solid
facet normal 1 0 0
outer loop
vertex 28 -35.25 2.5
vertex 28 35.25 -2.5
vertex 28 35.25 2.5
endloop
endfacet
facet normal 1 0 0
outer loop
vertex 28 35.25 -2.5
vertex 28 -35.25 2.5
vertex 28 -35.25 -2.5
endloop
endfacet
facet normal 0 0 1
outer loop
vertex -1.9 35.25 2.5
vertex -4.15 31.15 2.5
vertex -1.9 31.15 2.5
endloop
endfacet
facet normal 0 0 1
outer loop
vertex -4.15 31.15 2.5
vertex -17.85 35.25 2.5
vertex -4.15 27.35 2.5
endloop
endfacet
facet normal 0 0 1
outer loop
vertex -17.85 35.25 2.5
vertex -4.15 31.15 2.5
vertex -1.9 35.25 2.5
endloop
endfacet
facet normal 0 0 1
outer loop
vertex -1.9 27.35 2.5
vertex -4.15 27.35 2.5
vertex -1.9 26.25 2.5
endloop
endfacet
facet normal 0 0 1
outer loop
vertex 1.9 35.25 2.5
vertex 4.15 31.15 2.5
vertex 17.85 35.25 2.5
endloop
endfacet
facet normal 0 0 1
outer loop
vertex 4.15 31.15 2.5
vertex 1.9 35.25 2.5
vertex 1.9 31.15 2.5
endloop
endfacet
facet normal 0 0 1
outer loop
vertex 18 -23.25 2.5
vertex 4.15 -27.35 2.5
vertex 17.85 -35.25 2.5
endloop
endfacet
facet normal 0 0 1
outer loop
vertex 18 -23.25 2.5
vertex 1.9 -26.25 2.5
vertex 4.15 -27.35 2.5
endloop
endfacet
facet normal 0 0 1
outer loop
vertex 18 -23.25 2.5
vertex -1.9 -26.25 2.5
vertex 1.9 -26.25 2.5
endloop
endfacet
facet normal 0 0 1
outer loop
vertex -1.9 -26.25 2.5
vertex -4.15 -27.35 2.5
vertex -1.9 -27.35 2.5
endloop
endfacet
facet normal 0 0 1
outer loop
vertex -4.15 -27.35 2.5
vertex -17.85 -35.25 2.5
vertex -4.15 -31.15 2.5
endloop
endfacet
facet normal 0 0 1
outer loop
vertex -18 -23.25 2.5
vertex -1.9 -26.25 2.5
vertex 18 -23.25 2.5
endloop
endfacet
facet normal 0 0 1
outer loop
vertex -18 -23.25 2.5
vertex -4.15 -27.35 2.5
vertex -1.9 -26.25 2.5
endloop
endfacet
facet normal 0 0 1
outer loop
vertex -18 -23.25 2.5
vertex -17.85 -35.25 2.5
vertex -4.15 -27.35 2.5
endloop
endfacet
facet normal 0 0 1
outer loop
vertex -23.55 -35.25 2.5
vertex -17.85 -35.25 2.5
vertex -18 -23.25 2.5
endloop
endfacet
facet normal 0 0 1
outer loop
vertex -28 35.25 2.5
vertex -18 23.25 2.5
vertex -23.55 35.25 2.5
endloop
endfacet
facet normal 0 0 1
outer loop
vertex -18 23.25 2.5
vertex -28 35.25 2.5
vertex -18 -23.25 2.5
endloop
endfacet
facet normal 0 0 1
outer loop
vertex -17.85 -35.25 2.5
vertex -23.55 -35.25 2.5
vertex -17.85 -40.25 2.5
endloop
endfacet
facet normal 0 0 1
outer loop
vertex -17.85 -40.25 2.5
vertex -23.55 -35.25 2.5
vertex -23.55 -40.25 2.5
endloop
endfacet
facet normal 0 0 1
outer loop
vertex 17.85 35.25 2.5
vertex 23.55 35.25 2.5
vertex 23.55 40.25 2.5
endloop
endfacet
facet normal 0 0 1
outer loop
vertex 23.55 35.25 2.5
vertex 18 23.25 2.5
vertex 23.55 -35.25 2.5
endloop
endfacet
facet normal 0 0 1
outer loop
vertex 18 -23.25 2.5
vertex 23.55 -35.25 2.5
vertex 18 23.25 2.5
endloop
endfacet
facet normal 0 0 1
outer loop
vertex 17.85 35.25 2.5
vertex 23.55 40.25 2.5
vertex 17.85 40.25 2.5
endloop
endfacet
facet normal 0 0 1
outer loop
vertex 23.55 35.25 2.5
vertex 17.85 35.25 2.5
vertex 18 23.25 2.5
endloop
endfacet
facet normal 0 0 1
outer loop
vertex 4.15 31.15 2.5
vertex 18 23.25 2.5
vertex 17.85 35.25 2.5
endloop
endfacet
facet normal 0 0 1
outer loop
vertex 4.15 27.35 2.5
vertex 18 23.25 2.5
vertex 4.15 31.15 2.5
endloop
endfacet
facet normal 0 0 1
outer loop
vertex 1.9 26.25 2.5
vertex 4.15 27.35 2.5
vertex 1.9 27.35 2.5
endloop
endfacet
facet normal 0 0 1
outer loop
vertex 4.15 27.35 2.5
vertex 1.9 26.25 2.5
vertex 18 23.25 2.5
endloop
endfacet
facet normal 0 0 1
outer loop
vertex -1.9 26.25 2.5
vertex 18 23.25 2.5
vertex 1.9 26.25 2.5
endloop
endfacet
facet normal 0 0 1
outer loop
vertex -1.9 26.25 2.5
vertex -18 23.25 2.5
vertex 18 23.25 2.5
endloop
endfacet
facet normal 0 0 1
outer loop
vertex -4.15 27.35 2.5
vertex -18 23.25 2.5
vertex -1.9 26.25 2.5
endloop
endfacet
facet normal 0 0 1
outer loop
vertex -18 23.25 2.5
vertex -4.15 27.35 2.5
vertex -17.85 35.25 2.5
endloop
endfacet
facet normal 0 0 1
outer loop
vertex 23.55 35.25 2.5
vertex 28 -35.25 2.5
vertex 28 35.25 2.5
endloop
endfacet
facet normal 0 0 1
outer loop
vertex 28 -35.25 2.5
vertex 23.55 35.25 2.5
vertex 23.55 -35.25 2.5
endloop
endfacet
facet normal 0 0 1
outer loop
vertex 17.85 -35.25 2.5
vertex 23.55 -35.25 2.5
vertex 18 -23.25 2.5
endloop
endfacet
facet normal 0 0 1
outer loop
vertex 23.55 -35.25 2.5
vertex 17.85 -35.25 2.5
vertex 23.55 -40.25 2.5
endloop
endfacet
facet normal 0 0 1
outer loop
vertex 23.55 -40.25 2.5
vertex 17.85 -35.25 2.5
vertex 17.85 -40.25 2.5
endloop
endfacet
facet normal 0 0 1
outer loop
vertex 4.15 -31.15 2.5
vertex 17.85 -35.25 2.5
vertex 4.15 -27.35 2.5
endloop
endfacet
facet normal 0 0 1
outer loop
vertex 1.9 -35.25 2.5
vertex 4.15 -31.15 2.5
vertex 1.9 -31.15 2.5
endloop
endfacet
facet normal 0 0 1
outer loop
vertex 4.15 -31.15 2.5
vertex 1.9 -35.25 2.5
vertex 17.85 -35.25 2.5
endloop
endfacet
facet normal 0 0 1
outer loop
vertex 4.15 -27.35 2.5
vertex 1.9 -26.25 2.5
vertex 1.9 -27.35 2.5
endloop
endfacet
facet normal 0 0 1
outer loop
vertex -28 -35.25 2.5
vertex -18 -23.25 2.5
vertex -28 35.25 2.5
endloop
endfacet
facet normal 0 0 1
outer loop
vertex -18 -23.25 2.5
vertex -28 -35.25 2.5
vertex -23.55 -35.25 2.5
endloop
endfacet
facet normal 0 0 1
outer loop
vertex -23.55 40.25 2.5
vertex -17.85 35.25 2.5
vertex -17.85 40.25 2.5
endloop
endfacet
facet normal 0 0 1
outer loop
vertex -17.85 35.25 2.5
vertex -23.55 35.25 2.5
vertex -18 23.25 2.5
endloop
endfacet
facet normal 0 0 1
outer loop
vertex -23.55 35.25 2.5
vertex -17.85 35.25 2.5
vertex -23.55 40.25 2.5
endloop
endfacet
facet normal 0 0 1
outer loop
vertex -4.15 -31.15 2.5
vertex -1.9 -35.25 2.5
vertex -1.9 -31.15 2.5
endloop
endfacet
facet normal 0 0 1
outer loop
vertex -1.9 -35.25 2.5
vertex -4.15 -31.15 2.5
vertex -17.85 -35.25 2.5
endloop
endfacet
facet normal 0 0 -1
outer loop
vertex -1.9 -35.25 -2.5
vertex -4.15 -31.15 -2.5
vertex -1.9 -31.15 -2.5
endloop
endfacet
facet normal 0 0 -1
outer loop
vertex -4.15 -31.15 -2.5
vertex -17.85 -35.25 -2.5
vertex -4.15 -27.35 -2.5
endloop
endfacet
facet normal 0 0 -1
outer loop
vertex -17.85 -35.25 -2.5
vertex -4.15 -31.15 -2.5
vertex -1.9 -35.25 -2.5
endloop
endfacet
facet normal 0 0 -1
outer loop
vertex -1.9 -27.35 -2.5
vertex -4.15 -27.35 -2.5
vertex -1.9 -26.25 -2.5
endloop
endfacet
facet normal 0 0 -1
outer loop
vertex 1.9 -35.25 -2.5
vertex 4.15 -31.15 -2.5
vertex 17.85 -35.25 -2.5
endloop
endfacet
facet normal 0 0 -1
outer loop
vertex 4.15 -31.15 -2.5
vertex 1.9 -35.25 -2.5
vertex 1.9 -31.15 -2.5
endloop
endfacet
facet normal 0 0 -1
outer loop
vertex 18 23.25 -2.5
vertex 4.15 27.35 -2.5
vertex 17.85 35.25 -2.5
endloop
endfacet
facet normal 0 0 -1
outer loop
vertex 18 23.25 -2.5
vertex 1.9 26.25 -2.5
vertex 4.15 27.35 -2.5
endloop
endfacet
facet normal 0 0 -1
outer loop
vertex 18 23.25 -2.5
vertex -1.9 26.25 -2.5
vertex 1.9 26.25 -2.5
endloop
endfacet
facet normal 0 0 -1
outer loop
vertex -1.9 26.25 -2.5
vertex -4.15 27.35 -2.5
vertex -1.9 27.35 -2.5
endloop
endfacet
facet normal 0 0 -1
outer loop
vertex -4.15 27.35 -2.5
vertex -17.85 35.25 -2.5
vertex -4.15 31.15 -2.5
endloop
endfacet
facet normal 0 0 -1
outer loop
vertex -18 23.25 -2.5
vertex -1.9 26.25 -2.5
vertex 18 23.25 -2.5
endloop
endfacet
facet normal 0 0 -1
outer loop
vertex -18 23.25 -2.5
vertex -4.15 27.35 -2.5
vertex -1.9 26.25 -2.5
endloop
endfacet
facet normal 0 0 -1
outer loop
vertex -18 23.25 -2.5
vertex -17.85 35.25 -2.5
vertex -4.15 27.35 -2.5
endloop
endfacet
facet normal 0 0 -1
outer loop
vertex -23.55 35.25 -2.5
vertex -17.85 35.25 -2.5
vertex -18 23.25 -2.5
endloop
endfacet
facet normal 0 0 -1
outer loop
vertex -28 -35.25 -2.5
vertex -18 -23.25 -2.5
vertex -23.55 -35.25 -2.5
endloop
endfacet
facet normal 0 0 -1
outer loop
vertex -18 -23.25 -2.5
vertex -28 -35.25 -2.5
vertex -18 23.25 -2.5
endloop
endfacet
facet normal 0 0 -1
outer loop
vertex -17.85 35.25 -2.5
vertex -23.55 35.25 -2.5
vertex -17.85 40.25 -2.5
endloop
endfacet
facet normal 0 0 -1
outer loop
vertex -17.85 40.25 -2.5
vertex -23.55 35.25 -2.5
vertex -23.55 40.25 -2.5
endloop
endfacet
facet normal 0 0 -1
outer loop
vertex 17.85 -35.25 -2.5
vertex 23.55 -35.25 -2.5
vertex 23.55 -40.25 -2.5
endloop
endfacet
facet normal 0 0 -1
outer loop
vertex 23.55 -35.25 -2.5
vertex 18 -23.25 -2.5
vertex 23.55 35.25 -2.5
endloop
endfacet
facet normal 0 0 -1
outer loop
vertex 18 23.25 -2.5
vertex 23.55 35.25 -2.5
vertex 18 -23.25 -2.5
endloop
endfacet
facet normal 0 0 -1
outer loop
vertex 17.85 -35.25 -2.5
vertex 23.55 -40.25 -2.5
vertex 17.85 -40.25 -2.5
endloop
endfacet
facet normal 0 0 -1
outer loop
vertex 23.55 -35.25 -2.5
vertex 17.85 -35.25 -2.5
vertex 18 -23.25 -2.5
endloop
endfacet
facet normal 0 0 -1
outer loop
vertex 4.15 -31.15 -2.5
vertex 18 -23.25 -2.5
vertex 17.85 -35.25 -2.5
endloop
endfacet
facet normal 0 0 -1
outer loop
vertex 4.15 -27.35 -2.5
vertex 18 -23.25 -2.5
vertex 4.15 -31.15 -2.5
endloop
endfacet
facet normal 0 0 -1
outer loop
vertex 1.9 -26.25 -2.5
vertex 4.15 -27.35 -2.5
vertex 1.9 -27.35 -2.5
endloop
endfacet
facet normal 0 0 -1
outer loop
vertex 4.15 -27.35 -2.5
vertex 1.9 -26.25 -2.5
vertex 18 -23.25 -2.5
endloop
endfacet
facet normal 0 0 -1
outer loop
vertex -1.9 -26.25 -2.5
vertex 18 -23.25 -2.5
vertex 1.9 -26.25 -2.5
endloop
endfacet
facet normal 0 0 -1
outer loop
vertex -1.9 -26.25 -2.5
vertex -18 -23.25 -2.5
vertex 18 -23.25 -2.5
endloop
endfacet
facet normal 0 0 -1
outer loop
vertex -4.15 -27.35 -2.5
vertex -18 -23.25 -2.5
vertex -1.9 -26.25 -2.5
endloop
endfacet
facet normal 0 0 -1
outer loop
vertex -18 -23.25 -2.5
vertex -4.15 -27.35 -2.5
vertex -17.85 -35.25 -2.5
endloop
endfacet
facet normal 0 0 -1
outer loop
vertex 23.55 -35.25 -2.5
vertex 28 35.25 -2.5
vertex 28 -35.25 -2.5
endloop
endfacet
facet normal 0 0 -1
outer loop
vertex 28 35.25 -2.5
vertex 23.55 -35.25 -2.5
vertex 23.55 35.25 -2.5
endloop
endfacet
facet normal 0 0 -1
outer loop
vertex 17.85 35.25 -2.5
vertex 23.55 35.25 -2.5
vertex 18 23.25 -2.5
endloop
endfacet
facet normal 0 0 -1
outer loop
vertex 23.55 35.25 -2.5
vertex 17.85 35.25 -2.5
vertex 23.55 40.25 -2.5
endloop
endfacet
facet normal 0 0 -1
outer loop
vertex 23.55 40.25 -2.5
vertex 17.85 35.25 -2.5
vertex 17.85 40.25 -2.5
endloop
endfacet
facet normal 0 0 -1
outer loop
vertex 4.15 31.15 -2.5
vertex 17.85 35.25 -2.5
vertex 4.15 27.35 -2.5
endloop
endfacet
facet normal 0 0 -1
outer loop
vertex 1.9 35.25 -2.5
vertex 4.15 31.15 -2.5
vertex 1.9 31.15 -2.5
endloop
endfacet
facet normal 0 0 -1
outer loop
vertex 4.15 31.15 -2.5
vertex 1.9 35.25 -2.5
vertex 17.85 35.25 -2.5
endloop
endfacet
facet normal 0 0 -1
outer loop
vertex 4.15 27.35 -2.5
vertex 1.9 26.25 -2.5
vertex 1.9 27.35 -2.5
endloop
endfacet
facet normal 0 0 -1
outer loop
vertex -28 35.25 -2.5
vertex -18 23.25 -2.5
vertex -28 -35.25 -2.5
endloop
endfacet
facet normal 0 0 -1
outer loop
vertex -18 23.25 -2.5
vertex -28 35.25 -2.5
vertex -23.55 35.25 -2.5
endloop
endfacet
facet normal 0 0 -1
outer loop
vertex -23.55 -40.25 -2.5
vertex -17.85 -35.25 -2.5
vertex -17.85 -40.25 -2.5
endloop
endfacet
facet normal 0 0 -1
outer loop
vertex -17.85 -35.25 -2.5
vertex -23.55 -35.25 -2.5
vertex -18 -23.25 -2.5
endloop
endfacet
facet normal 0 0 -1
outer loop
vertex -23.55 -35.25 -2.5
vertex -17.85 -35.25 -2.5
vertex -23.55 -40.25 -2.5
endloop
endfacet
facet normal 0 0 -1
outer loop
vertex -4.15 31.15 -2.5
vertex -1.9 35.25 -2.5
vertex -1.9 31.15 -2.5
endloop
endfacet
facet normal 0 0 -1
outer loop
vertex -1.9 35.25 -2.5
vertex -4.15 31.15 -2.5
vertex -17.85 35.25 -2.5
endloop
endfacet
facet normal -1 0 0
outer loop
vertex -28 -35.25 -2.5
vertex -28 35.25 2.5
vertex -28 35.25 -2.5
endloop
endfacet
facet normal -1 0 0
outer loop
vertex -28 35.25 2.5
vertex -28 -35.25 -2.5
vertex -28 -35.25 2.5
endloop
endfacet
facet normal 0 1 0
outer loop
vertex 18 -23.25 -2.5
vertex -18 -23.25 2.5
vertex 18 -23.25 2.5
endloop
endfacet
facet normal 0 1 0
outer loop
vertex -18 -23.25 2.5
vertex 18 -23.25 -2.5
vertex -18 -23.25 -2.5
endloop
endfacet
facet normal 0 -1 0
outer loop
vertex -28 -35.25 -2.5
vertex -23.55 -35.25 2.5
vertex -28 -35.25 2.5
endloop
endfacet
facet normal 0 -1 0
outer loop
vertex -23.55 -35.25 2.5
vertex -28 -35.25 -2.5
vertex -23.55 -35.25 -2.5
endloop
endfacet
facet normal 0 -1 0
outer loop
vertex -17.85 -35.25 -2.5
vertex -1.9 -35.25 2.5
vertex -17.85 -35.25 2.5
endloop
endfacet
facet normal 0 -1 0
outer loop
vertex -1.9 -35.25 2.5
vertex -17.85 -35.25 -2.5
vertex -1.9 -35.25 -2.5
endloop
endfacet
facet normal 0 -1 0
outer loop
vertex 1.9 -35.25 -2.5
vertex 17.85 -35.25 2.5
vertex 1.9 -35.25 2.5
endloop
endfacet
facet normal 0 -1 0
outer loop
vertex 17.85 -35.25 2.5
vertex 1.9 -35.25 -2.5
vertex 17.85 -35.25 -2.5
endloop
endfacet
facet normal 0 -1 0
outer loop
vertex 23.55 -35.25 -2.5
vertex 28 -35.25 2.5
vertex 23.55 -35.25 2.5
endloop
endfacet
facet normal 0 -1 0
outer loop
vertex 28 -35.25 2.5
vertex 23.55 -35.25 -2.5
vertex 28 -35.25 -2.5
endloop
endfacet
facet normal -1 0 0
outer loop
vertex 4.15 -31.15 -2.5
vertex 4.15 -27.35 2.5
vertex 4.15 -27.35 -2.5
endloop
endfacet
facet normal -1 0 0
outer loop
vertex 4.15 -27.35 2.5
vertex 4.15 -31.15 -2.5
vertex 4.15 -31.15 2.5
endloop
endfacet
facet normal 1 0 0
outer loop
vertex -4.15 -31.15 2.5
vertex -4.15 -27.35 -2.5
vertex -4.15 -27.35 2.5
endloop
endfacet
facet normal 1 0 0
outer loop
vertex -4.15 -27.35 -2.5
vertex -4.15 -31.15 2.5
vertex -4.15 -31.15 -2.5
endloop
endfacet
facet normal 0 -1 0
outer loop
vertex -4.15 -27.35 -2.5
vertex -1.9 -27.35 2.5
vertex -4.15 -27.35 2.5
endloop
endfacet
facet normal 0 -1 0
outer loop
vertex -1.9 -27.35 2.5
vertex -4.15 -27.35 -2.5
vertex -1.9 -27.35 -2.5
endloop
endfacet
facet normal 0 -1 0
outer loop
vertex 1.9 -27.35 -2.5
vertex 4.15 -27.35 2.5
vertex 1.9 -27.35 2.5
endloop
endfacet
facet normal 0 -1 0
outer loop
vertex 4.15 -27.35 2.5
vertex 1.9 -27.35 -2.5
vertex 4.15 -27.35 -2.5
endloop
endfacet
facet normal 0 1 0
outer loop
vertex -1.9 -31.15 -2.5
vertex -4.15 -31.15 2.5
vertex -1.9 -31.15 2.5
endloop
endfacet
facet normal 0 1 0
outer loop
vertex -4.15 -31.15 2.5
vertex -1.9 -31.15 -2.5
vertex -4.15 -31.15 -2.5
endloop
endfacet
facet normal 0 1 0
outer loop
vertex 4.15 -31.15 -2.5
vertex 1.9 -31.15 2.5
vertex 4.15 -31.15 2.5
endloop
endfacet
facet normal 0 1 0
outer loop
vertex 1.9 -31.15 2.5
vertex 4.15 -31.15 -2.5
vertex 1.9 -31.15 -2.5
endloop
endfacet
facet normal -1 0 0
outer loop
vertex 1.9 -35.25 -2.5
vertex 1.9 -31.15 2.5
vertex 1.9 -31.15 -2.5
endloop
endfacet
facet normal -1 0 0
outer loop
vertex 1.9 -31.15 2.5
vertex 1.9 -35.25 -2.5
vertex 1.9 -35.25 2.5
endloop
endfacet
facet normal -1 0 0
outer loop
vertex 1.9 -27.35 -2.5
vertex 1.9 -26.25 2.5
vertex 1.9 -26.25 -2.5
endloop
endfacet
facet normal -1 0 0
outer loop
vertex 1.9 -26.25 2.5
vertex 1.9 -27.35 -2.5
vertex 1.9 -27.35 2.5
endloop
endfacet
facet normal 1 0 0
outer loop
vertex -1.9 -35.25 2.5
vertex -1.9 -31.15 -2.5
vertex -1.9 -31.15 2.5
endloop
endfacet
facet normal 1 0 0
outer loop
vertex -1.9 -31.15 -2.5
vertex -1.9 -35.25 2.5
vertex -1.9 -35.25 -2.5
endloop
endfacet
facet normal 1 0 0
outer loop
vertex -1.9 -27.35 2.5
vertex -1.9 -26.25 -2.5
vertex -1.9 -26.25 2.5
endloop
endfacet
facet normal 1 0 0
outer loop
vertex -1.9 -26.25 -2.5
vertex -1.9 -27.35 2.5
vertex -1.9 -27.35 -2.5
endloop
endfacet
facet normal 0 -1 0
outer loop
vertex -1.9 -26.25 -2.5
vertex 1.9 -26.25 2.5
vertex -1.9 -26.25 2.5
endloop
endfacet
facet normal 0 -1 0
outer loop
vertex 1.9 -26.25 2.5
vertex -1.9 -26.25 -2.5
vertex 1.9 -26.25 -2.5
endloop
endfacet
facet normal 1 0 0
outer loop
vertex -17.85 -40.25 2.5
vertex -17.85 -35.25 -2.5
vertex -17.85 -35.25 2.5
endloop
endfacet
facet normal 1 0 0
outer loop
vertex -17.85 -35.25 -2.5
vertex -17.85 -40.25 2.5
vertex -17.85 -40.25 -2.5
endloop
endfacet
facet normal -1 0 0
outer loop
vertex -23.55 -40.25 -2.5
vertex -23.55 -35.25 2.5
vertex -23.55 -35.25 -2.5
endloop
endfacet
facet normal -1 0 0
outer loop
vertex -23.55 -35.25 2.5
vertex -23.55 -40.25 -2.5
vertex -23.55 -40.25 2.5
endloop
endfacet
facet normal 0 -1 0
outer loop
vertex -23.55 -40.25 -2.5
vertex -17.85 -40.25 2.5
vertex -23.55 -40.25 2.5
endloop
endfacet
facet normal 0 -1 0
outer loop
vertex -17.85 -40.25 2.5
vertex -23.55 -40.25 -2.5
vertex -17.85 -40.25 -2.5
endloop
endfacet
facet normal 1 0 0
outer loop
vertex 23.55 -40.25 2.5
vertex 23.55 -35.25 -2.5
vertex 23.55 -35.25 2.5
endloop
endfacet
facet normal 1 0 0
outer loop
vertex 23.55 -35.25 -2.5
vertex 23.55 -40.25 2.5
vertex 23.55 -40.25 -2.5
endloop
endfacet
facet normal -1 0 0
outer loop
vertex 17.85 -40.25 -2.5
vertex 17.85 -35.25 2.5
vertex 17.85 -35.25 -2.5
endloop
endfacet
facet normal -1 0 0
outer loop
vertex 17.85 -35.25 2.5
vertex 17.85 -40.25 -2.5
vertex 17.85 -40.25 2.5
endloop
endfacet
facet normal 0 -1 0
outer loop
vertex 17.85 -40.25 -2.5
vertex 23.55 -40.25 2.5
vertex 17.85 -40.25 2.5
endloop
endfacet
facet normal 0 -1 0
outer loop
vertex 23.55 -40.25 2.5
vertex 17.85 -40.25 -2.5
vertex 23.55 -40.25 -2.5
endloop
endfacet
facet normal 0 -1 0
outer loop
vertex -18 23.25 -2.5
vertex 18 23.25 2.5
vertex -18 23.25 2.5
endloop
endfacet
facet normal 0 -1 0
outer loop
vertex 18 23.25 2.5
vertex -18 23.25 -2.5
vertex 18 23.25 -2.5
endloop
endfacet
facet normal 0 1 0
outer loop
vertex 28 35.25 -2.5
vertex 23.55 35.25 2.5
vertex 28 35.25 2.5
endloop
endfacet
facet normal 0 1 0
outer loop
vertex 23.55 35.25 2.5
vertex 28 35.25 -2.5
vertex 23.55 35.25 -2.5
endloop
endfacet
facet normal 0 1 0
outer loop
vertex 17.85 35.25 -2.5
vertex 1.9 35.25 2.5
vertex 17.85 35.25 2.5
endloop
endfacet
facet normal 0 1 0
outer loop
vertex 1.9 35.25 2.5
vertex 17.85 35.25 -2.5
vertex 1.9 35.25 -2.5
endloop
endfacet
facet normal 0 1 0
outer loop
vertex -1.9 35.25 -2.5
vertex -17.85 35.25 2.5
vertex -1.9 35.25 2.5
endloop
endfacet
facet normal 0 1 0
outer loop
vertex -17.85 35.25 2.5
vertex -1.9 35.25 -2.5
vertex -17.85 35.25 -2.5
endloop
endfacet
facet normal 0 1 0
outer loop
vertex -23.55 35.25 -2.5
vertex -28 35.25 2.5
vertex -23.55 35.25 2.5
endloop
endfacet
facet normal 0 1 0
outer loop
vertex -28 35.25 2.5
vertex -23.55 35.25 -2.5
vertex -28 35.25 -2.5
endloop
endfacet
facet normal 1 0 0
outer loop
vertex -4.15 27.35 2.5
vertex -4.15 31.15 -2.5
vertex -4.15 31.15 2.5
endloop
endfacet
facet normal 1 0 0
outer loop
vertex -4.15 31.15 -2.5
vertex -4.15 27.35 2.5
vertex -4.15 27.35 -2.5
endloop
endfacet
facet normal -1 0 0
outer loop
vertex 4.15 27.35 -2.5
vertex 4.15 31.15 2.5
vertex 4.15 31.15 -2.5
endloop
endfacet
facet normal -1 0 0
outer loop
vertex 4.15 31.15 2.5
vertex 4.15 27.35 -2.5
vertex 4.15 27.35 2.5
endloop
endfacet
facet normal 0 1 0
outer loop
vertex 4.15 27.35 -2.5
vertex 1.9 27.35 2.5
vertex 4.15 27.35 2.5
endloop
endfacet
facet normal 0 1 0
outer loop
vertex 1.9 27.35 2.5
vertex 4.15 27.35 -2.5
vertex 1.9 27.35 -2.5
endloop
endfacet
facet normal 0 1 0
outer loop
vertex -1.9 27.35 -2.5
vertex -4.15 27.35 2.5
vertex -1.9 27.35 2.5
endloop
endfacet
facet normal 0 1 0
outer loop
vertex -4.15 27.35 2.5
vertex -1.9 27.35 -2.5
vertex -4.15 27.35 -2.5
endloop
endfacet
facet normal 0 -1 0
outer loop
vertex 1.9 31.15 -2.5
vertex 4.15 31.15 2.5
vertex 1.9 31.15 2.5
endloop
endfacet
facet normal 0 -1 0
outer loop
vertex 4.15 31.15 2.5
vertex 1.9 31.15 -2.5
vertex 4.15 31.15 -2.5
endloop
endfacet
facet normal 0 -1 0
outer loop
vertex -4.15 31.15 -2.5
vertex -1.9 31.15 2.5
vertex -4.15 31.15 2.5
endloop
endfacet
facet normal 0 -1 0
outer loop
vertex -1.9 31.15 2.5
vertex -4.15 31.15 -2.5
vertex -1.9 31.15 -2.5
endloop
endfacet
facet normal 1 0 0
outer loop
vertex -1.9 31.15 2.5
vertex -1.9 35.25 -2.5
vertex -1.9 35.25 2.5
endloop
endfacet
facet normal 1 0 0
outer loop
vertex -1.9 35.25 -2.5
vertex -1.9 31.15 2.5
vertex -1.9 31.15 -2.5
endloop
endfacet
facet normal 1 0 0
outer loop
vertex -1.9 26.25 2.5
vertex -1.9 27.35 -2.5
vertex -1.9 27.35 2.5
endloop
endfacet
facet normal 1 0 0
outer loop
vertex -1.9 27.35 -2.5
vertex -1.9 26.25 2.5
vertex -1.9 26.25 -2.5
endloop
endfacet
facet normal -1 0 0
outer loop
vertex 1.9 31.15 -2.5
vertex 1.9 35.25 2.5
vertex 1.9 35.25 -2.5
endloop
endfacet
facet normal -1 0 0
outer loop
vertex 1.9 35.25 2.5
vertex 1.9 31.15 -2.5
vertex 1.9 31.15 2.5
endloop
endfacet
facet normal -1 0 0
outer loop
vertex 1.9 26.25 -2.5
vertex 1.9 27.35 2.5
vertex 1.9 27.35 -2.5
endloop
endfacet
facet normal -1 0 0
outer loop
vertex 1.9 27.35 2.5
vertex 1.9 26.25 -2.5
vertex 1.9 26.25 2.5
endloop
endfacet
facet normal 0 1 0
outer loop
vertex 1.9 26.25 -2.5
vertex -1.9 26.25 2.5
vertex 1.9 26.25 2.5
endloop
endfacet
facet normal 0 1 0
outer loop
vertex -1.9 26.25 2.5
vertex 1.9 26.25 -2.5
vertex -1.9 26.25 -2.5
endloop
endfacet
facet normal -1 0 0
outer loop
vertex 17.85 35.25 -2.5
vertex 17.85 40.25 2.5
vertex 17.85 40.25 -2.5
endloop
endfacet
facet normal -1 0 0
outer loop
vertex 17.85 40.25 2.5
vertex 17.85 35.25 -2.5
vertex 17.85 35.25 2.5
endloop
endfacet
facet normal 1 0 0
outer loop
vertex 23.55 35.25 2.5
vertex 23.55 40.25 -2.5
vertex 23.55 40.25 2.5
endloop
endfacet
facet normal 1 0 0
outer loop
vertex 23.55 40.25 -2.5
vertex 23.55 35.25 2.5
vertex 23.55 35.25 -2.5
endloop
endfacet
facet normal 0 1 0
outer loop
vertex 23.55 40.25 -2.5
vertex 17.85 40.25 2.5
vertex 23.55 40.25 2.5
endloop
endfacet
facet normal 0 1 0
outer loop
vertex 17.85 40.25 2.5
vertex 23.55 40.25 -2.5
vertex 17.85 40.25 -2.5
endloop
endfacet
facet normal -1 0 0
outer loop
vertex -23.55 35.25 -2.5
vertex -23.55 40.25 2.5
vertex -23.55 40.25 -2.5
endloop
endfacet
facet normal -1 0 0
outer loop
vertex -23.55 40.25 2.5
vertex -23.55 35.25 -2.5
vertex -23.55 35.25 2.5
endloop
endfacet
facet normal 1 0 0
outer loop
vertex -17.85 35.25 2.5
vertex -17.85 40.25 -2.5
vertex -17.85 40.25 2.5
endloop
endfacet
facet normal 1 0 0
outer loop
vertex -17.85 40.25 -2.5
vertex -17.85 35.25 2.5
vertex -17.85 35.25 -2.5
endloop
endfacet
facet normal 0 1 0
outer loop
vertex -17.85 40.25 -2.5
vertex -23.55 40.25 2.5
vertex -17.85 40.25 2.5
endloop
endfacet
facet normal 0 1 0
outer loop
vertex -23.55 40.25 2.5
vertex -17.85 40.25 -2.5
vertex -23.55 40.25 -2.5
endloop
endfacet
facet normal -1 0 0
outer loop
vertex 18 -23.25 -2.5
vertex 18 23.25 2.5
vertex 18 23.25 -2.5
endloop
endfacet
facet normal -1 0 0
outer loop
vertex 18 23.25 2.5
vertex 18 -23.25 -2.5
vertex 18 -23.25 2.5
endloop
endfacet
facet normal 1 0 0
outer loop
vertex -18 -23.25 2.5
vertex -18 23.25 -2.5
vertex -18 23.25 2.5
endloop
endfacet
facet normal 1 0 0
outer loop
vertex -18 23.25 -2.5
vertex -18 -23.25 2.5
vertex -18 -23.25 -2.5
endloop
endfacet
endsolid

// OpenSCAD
// The width of the spool in mm
spool_width = 68.5; // [1:100]
// Clearance between the spool and the holder in mm
clearance = 2; // [1:10]


module side(){
	difference(){
		cube([56,12,5],center=true);
		cube([8.3,3.8,6],center=true);
		translate([0,-2,0])cube([3.8,10,6],center=true);
	}
	translate([-35.7/2-5.7/2,-8.5,0])cube([5.7,5,,5],center=true);
	translate([35.7/2+5.7/2,-8.5,0])cube([5.7,5,,5],center=true);
}
width=spool_width + clearance;
translate([0,-width/2+6,0]){
	side();
	translate([0,width-12,0])rotate(180)side();
}
translate([56/2-10/2,0,0])cube([10,width,5],center=true);
translate([-56/2+10/2,0,0])cube([10,width,5],center=true);
